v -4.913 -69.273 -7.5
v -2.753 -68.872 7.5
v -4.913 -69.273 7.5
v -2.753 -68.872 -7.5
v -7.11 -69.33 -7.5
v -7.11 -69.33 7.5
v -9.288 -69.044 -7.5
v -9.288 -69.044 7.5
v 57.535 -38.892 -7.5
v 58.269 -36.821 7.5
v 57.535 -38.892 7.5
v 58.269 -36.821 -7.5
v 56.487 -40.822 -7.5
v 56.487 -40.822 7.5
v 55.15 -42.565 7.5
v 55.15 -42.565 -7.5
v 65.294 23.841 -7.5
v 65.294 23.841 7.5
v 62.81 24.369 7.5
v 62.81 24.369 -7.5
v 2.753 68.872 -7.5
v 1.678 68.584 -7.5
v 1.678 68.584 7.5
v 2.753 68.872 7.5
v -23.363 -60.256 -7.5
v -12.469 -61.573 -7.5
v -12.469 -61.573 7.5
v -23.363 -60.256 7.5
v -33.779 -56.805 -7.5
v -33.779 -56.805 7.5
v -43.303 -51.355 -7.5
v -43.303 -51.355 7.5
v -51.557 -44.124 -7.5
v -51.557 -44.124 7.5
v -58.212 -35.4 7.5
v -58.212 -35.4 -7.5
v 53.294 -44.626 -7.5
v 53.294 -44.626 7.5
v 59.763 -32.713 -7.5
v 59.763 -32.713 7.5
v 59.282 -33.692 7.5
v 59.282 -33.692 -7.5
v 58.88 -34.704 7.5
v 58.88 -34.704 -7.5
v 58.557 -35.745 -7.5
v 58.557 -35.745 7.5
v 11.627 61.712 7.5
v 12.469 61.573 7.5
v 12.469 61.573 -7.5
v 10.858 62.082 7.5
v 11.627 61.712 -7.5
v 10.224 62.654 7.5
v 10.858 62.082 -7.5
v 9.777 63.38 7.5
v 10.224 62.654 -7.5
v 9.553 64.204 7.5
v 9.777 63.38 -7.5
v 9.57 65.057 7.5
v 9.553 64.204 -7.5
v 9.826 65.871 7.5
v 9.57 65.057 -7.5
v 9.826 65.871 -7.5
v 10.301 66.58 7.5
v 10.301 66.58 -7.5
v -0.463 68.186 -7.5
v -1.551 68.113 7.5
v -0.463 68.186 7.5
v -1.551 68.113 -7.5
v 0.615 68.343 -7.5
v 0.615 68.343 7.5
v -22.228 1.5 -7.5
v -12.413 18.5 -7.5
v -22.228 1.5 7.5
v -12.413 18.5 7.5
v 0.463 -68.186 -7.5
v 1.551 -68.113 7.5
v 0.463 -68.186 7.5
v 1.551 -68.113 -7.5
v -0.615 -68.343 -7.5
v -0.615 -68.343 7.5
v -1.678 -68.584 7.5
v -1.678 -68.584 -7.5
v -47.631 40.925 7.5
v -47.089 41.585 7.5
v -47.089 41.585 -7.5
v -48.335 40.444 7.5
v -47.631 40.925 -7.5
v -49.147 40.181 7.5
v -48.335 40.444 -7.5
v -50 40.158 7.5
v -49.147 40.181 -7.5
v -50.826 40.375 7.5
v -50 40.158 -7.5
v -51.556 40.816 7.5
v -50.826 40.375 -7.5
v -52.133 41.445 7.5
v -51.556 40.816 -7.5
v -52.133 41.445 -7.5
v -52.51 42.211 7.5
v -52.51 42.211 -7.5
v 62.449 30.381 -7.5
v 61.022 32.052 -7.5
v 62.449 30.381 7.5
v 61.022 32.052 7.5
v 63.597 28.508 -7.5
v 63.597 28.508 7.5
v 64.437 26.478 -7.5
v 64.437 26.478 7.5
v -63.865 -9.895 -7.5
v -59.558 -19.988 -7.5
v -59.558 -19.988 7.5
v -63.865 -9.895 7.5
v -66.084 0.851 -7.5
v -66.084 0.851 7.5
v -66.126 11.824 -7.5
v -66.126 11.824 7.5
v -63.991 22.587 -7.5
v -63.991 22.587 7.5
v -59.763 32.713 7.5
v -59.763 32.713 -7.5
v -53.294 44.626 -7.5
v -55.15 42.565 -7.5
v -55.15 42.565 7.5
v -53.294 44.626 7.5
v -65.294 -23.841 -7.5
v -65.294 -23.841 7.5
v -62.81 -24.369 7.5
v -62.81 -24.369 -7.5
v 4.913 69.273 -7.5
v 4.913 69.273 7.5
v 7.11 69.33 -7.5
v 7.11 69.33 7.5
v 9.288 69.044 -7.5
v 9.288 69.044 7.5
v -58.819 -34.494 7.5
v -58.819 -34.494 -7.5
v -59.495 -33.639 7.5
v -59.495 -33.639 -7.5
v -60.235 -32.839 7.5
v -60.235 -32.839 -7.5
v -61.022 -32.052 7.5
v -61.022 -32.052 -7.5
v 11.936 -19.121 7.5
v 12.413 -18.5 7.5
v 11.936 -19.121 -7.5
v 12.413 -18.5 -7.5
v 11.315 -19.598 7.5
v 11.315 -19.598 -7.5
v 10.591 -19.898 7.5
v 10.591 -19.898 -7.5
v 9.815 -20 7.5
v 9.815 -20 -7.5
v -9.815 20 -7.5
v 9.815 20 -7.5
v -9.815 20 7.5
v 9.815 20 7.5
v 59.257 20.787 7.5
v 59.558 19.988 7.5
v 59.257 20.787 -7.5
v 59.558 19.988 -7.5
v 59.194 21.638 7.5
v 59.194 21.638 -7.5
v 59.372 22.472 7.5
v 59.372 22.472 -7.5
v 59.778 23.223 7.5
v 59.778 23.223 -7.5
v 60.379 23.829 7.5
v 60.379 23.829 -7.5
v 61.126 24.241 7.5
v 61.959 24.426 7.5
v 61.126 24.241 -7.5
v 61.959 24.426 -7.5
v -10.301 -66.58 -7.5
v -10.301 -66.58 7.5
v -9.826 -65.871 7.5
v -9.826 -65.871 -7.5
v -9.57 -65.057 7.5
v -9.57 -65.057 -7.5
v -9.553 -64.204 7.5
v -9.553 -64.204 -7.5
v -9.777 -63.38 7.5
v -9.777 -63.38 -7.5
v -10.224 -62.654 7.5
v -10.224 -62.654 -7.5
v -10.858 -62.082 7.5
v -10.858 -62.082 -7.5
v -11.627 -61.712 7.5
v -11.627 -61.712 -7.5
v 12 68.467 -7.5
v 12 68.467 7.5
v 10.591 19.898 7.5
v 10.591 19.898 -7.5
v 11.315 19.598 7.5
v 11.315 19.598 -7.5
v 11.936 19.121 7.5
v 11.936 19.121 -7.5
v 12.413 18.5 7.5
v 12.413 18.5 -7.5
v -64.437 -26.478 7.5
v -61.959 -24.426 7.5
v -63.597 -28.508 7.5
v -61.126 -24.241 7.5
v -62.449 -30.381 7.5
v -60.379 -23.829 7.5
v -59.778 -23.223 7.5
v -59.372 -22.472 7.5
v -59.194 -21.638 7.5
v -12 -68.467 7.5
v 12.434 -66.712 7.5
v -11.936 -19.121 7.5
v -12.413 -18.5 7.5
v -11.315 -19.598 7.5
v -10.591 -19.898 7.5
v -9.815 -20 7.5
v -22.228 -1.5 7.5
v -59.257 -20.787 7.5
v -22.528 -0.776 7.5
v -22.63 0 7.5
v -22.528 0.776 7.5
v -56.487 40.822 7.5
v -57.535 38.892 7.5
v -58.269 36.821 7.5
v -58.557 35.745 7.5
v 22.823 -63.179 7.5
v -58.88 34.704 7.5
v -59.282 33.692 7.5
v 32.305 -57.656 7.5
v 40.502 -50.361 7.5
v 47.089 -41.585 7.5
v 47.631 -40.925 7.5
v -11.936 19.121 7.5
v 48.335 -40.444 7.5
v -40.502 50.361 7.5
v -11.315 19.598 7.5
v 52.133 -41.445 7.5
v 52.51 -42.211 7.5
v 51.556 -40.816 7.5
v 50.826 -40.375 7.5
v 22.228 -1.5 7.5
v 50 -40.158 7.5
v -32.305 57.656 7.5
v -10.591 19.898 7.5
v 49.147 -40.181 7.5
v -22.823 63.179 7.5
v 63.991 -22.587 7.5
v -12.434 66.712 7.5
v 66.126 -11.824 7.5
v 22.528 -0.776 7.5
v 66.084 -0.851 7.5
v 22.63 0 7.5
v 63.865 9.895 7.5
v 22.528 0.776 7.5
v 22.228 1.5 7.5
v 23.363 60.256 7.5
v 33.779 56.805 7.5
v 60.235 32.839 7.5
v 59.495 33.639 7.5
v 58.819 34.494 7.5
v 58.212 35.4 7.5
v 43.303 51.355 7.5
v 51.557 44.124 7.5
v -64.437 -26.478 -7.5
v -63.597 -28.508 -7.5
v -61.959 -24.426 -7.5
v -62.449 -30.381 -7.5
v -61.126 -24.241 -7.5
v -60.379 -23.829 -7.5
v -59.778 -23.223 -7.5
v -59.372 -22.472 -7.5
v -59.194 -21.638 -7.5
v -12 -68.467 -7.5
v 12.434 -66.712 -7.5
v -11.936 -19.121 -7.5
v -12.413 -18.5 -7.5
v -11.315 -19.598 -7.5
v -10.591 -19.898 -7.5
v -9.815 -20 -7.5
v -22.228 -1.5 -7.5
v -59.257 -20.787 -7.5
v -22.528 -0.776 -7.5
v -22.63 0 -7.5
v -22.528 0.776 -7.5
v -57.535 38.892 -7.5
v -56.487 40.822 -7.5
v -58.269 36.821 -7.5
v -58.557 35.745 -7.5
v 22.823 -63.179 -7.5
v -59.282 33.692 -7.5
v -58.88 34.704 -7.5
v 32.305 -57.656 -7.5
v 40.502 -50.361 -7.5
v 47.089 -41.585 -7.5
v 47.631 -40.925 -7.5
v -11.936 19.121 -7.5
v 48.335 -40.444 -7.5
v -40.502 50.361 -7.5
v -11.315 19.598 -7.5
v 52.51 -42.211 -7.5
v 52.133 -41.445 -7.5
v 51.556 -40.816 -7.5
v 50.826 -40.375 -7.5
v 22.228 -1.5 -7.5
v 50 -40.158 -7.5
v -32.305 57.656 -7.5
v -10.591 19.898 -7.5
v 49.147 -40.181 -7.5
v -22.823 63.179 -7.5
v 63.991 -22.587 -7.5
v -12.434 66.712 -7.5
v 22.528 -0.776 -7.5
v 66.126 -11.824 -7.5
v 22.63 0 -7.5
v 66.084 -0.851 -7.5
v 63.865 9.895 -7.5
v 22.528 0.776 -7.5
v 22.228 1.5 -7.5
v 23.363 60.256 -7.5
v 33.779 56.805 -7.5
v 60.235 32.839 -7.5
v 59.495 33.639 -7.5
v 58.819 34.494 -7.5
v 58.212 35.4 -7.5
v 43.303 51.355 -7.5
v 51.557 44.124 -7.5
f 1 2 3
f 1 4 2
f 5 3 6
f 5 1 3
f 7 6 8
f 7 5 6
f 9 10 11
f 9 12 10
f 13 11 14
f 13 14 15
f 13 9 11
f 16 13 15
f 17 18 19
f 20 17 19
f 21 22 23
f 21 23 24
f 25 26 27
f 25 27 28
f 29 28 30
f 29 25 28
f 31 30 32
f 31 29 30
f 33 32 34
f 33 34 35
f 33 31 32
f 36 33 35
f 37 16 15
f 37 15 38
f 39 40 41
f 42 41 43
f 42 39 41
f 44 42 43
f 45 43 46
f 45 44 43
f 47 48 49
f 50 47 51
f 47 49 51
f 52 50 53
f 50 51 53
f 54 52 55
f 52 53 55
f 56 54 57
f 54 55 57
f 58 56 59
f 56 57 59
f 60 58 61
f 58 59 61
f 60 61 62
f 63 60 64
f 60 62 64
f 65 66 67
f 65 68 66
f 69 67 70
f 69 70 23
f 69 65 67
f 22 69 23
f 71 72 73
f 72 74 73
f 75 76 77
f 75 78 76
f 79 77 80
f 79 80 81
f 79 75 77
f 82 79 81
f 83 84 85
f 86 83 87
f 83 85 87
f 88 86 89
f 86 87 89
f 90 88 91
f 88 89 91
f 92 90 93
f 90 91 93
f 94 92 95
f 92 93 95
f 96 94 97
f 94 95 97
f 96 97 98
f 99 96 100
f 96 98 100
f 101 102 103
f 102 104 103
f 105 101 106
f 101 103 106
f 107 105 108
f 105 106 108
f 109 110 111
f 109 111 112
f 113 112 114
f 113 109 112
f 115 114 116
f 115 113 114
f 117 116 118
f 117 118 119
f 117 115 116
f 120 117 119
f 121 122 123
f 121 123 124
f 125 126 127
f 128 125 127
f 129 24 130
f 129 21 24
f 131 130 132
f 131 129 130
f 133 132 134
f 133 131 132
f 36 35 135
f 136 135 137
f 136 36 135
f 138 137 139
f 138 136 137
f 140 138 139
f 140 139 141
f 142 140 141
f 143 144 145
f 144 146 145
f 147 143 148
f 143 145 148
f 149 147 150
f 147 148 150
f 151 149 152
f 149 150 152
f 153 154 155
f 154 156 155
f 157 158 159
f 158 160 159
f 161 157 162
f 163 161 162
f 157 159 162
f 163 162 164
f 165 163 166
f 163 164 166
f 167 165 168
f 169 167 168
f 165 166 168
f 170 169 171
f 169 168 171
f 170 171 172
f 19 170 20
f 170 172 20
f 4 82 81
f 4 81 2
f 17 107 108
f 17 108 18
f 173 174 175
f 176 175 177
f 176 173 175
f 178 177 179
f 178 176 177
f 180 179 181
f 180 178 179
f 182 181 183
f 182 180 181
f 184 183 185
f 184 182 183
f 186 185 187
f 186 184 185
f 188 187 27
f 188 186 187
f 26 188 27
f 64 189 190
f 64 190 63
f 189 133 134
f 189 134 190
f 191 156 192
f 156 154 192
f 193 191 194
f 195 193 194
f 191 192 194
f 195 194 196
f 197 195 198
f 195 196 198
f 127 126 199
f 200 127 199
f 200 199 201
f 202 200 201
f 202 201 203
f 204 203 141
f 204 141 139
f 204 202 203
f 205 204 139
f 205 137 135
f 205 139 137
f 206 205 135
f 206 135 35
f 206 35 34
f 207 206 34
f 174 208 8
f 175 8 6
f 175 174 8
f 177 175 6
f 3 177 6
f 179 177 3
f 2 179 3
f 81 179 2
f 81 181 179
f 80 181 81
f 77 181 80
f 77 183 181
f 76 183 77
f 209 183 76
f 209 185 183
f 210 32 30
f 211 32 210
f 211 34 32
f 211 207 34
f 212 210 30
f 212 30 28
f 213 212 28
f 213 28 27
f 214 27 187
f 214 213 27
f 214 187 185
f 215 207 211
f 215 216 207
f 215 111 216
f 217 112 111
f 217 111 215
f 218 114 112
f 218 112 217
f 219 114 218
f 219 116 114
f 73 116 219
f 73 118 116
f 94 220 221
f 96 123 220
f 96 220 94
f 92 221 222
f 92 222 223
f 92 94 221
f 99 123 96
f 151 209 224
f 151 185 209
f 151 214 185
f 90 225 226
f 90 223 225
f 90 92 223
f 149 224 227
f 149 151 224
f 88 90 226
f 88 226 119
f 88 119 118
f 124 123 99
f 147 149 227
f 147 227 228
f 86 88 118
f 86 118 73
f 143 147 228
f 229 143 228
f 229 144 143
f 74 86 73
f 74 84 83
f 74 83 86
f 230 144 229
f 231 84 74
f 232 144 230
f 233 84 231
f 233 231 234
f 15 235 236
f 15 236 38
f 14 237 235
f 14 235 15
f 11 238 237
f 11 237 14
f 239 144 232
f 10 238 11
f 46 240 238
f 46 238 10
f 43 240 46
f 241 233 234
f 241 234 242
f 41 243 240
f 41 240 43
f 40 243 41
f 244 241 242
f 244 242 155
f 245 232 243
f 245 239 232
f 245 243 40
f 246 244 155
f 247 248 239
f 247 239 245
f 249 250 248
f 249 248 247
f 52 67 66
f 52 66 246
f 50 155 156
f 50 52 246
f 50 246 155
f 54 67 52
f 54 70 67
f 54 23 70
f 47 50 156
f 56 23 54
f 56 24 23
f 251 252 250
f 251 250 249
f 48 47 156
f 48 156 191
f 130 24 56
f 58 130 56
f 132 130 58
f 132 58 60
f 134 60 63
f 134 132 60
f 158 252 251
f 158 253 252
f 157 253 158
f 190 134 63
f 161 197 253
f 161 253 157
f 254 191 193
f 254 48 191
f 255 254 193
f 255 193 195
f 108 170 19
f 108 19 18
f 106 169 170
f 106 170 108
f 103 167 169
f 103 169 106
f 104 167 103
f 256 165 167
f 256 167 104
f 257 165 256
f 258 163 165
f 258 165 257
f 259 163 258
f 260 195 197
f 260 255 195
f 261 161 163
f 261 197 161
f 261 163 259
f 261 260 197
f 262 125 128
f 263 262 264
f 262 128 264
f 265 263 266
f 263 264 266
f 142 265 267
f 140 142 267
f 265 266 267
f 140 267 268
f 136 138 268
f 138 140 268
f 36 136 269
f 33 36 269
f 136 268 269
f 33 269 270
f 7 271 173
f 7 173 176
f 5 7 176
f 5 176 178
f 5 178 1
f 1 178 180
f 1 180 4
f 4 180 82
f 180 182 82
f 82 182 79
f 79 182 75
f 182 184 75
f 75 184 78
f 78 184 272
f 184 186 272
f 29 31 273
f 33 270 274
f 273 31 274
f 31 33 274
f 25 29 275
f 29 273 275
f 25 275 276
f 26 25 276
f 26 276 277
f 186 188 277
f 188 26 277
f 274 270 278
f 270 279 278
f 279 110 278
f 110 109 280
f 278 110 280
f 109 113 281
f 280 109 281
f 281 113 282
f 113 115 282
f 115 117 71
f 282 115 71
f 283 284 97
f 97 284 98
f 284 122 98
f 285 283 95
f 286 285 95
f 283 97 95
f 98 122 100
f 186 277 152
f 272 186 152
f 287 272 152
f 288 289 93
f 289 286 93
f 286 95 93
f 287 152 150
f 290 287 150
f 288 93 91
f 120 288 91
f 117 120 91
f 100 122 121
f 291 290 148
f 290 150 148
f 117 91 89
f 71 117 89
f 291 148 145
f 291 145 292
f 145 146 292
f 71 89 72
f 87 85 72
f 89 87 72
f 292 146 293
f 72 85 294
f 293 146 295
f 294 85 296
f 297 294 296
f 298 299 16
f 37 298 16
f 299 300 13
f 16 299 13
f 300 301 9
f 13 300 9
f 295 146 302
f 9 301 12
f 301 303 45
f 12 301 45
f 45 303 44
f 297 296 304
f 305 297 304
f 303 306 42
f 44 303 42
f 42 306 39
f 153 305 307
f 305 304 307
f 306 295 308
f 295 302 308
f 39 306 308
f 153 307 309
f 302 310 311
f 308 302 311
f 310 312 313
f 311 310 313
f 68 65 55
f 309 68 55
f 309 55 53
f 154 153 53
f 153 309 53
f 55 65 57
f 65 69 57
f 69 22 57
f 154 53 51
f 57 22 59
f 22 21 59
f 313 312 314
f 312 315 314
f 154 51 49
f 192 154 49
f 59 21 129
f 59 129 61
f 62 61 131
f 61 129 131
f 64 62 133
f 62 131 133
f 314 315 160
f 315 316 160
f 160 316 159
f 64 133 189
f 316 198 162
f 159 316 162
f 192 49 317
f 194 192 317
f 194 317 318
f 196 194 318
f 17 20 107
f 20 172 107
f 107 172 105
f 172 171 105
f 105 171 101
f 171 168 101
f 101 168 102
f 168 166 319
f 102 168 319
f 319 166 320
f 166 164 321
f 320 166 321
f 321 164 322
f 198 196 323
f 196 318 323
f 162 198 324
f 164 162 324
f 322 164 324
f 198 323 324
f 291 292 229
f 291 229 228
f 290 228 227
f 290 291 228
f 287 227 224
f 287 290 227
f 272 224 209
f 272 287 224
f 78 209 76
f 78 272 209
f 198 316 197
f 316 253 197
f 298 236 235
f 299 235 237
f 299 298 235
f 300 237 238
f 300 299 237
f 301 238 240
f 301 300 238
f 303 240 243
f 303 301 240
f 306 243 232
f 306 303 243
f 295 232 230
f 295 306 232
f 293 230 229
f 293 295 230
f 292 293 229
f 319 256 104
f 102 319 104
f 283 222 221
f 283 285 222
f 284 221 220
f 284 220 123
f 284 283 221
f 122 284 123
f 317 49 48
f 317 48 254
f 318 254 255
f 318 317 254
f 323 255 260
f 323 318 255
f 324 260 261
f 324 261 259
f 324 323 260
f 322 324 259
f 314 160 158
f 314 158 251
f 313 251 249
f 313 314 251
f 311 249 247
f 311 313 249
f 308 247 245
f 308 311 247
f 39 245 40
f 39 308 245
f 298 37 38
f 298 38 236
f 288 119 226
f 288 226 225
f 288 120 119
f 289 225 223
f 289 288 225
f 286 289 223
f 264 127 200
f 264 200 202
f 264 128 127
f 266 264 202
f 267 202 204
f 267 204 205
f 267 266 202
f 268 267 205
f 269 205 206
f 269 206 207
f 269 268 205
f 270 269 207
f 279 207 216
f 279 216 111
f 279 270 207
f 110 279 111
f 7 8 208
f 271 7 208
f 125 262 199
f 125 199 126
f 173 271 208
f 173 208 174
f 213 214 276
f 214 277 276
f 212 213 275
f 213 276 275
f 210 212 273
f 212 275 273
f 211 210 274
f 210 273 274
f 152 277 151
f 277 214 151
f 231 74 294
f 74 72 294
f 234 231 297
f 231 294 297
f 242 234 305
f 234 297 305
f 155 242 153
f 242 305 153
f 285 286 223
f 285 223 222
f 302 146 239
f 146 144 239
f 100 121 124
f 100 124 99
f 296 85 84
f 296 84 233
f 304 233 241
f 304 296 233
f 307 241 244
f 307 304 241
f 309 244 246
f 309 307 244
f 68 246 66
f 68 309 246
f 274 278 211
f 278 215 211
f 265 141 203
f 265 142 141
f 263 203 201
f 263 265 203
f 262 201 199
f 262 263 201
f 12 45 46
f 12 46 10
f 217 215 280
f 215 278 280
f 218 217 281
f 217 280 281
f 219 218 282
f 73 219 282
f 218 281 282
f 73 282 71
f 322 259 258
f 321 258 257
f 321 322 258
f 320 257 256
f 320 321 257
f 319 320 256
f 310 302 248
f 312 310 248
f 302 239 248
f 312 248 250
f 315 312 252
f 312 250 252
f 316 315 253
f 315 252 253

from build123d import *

# Parameters (mm, degrees)
SKETCH1_R               = 70
BOSS_EXTRUDE1_DEPTH     = 7.5
FILLET1_R               = 3
CUT_EXTRUDE2_DEPTH      = 100.278648258
CUT_EXTRUDE2_DEPTH_BACK = 100.278648258
CUT_EXTRUDE3_DEPTH      = 98.628141683
CUT_EXTRUDE3_DEPTH_BACK = 98.628141683
FILLET2_R               = 14
FILLET3_R               = 3


with BuildPart() as part:
    # Sketch1 → Boss-Extrude1 (new, symmetric)
    with BuildSketch(Plane.XY):
        Circle(SKETCH1_R)
        Polygon((23.094010768, 0), (11.547005384, 20), (-11.547005384, 20), (-23.094010768, 0), (-11.547005384, -20), (11.547005384, -20), align=None, mode=Mode.SUBTRACT)
    extrude(amount=BOSS_EXTRUDE1_DEPTH, both=True)

    # Fillet1
    fillet1_edges = [part.edges().sort_by_distance(p)[0] for p in [
        (23.094010768, 0, 0),
        (11.547005384, 20, 0),
        (-11.547005384, 20, 0),
        (-23.094010768, 0, 0),
        (-11.547005384, -20, 0),
        (11.547005384, -20, 0),
    ]]
    fillet(fillet1_edges, radius=FILLET1_R)

    # Sketch3 → Cut-Extrude2 (cut, two sides)
    with BuildSketch(Plane.XY) as cut_extrude2_sk:
        with BuildLine():
            ThreePointArc((63.398675482, 29.675039126), (40.067343971, 57.398675482), (6, 69.742383097))
            Line((6, 69.742383097), (12, 68.467043727))
            Line((12, 68.467043727), (5.525264217, 61.276121136))
            ThreePointArc((5.525264217, 61.276121136), (36.300148732, 55.601545074), (59.006370637, 34.067343971))
            Line((59.006370637, 34.067343971), (63.398675482, 29.675039126))
        make_face()
        with BuildLine():
            ThreePointArc((-50.304045441, 35.423079743), (-30.002276158, 59.2376235), (0, 68.134687942))
            Line((0, 68.134687942), (0, 70))
            ThreePointArc((0, 70), (-32.367313157, 62.067358885), (-57.398675482, 40.067343971))
            Line((-57.398675482, 40.067343971), (-53.294199189, 44.625826709))
            Line((-53.294199189, 44.625826709), (-50.304045441, 35.423079743))
        make_face()
        with BuildLine():
            ThreePointArc((70, 0), (68.329742001, 15.200209147), (63.398675482, 29.675039126))
            Line((63.398675482, 29.675039126), (65.294199189, 23.841217018))
            Line((65.294199189, 23.841217018), (55.829309658, 25.853041393))
            ThreePointArc((55.829309658, 25.853041393), (66.30242489, -3.636078426), (59.006370637, -34.067343971))
            Line((59.006370637, -34.067343971), (57.398675482, -40.067343971))
            ThreePointArc((57.398675482, -40.067343971), (66.77539698, -21.001103736), (70, 0))
        make_face()
        with BuildLine():
            Line((-59.006370637, 34.067343971), (-57.398675482, 40.067343971))
            ThreePointArc((-57.398675482, 40.067343971), (-69.742383097, 6), (-63.398675482, -29.675039126))
            Line((-63.398675482, -29.675039126), (-65.294199189, -23.841217018))
            Line((-65.294199189, -23.841217018), (-55.829309658, -25.853041393))
            ThreePointArc((-55.829309658, -25.853041393), (-66.30242489, 3.636078426), (-59.006370637, 34.067343971))
        make_face()
        with BuildLine():
            Line((-59.006370637, -34.067343971), (-63.398675482, -29.675039126))
            ThreePointArc((-63.398675482, -29.675039126), (-40.067343971, -57.398675482), (-6, -69.742383097))
            Line((-6, -69.742383097), (-12, -68.467043727))
            Line((-12, -68.467043727), (-5.525264217, -61.276121136))
            ThreePointArc((-5.525264217, -61.276121136), (-36.300148732, -55.601545074), (-59.006370637, -34.067343971))
        make_face()
        with BuildLine():
            Line((0, -68.134687942), (-6, -69.742383097))
            ThreePointArc((-6, -69.742383097), (29.675039126, -63.398675482), (57.398675482, -40.067343971))
            Line((57.398675482, -40.067343971), (53.294199189, -44.625826709))
            Line((53.294199189, -44.625826709), (50.304045441, -35.423079743))
            ThreePointArc((50.304045441, -35.423079743), (30.002276158, -59.2376235), (0, -68.134687942))
        make_face()
    extrude(amount=CUT_EXTRUDE2_DEPTH, mode=Mode.SUBTRACT)
    extrude(cut_extrude2_sk.sketch, amount=-CUT_EXTRUDE2_DEPTH_BACK, mode=Mode.SUBTRACT)

    # Sketch4 → Cut-Extrude3 (cut, two sides)
    with BuildSketch(Plane.XY.offset(7.5)) as cut_extrude3_sk:
        Polygon((0, 68.134687942), (6, 69.742383097), (0, 70), align=None)
    extrude(amount=CUT_EXTRUDE3_DEPTH, mode=Mode.SUBTRACT)
    extrude(cut_extrude3_sk.sketch, amount=-CUT_EXTRUDE3_DEPTH_BACK, mode=Mode.SUBTRACT)


with BuildPart() as body_2:
    # of the pieces the cut leaves, the one that is kept (cut_extrude3_keep)
    add(part.part.solids().sort_by_distance((55.829309658, 25.853041393, 7.5))[0])

    # Fillet2
    fillet2_edges = [body_2.edges().sort_by_distance(p)[0] for p in [
        (63.398675482, 29.675039126, 0),
        (-57.398675482, 40.067343971, 0),
        (-59.006370637, -34.067343971, 0),
        (-6, -69.742383097, 0),
        (0, 68.134687942, 0),
        (0, -68.134687942, 0),
        (57.398675482, -40.067343971, 0),
        (-59.006370637, 34.067343971, 0),
        (-63.398675482, -29.675039126, 0),
        (59.006370637, 34.067343971, 0),
        (6, 69.742383097, 0),
        (59.006370637, -34.067343971, 0),
    ]]
    fillet(fillet2_edges, radius=FILLET2_R)

    # Fillet3
    fillet3_edges = [body_2.edges().sort_by_distance(p)[0] for p in [
        (-50.304045441, 35.423079743, 0),
        (-5.525264217, -61.276121136, 0),
        (50.304045441, -35.423079743, 0),
        (-55.829309658, -25.853041393, 0),
        (5.525264217, 61.276121136, 0),
        (55.829309658, 25.853041393, 0),
    ]]
    fillet(fillet3_edges, radius=FILLET3_R)


solid = body_2.part
